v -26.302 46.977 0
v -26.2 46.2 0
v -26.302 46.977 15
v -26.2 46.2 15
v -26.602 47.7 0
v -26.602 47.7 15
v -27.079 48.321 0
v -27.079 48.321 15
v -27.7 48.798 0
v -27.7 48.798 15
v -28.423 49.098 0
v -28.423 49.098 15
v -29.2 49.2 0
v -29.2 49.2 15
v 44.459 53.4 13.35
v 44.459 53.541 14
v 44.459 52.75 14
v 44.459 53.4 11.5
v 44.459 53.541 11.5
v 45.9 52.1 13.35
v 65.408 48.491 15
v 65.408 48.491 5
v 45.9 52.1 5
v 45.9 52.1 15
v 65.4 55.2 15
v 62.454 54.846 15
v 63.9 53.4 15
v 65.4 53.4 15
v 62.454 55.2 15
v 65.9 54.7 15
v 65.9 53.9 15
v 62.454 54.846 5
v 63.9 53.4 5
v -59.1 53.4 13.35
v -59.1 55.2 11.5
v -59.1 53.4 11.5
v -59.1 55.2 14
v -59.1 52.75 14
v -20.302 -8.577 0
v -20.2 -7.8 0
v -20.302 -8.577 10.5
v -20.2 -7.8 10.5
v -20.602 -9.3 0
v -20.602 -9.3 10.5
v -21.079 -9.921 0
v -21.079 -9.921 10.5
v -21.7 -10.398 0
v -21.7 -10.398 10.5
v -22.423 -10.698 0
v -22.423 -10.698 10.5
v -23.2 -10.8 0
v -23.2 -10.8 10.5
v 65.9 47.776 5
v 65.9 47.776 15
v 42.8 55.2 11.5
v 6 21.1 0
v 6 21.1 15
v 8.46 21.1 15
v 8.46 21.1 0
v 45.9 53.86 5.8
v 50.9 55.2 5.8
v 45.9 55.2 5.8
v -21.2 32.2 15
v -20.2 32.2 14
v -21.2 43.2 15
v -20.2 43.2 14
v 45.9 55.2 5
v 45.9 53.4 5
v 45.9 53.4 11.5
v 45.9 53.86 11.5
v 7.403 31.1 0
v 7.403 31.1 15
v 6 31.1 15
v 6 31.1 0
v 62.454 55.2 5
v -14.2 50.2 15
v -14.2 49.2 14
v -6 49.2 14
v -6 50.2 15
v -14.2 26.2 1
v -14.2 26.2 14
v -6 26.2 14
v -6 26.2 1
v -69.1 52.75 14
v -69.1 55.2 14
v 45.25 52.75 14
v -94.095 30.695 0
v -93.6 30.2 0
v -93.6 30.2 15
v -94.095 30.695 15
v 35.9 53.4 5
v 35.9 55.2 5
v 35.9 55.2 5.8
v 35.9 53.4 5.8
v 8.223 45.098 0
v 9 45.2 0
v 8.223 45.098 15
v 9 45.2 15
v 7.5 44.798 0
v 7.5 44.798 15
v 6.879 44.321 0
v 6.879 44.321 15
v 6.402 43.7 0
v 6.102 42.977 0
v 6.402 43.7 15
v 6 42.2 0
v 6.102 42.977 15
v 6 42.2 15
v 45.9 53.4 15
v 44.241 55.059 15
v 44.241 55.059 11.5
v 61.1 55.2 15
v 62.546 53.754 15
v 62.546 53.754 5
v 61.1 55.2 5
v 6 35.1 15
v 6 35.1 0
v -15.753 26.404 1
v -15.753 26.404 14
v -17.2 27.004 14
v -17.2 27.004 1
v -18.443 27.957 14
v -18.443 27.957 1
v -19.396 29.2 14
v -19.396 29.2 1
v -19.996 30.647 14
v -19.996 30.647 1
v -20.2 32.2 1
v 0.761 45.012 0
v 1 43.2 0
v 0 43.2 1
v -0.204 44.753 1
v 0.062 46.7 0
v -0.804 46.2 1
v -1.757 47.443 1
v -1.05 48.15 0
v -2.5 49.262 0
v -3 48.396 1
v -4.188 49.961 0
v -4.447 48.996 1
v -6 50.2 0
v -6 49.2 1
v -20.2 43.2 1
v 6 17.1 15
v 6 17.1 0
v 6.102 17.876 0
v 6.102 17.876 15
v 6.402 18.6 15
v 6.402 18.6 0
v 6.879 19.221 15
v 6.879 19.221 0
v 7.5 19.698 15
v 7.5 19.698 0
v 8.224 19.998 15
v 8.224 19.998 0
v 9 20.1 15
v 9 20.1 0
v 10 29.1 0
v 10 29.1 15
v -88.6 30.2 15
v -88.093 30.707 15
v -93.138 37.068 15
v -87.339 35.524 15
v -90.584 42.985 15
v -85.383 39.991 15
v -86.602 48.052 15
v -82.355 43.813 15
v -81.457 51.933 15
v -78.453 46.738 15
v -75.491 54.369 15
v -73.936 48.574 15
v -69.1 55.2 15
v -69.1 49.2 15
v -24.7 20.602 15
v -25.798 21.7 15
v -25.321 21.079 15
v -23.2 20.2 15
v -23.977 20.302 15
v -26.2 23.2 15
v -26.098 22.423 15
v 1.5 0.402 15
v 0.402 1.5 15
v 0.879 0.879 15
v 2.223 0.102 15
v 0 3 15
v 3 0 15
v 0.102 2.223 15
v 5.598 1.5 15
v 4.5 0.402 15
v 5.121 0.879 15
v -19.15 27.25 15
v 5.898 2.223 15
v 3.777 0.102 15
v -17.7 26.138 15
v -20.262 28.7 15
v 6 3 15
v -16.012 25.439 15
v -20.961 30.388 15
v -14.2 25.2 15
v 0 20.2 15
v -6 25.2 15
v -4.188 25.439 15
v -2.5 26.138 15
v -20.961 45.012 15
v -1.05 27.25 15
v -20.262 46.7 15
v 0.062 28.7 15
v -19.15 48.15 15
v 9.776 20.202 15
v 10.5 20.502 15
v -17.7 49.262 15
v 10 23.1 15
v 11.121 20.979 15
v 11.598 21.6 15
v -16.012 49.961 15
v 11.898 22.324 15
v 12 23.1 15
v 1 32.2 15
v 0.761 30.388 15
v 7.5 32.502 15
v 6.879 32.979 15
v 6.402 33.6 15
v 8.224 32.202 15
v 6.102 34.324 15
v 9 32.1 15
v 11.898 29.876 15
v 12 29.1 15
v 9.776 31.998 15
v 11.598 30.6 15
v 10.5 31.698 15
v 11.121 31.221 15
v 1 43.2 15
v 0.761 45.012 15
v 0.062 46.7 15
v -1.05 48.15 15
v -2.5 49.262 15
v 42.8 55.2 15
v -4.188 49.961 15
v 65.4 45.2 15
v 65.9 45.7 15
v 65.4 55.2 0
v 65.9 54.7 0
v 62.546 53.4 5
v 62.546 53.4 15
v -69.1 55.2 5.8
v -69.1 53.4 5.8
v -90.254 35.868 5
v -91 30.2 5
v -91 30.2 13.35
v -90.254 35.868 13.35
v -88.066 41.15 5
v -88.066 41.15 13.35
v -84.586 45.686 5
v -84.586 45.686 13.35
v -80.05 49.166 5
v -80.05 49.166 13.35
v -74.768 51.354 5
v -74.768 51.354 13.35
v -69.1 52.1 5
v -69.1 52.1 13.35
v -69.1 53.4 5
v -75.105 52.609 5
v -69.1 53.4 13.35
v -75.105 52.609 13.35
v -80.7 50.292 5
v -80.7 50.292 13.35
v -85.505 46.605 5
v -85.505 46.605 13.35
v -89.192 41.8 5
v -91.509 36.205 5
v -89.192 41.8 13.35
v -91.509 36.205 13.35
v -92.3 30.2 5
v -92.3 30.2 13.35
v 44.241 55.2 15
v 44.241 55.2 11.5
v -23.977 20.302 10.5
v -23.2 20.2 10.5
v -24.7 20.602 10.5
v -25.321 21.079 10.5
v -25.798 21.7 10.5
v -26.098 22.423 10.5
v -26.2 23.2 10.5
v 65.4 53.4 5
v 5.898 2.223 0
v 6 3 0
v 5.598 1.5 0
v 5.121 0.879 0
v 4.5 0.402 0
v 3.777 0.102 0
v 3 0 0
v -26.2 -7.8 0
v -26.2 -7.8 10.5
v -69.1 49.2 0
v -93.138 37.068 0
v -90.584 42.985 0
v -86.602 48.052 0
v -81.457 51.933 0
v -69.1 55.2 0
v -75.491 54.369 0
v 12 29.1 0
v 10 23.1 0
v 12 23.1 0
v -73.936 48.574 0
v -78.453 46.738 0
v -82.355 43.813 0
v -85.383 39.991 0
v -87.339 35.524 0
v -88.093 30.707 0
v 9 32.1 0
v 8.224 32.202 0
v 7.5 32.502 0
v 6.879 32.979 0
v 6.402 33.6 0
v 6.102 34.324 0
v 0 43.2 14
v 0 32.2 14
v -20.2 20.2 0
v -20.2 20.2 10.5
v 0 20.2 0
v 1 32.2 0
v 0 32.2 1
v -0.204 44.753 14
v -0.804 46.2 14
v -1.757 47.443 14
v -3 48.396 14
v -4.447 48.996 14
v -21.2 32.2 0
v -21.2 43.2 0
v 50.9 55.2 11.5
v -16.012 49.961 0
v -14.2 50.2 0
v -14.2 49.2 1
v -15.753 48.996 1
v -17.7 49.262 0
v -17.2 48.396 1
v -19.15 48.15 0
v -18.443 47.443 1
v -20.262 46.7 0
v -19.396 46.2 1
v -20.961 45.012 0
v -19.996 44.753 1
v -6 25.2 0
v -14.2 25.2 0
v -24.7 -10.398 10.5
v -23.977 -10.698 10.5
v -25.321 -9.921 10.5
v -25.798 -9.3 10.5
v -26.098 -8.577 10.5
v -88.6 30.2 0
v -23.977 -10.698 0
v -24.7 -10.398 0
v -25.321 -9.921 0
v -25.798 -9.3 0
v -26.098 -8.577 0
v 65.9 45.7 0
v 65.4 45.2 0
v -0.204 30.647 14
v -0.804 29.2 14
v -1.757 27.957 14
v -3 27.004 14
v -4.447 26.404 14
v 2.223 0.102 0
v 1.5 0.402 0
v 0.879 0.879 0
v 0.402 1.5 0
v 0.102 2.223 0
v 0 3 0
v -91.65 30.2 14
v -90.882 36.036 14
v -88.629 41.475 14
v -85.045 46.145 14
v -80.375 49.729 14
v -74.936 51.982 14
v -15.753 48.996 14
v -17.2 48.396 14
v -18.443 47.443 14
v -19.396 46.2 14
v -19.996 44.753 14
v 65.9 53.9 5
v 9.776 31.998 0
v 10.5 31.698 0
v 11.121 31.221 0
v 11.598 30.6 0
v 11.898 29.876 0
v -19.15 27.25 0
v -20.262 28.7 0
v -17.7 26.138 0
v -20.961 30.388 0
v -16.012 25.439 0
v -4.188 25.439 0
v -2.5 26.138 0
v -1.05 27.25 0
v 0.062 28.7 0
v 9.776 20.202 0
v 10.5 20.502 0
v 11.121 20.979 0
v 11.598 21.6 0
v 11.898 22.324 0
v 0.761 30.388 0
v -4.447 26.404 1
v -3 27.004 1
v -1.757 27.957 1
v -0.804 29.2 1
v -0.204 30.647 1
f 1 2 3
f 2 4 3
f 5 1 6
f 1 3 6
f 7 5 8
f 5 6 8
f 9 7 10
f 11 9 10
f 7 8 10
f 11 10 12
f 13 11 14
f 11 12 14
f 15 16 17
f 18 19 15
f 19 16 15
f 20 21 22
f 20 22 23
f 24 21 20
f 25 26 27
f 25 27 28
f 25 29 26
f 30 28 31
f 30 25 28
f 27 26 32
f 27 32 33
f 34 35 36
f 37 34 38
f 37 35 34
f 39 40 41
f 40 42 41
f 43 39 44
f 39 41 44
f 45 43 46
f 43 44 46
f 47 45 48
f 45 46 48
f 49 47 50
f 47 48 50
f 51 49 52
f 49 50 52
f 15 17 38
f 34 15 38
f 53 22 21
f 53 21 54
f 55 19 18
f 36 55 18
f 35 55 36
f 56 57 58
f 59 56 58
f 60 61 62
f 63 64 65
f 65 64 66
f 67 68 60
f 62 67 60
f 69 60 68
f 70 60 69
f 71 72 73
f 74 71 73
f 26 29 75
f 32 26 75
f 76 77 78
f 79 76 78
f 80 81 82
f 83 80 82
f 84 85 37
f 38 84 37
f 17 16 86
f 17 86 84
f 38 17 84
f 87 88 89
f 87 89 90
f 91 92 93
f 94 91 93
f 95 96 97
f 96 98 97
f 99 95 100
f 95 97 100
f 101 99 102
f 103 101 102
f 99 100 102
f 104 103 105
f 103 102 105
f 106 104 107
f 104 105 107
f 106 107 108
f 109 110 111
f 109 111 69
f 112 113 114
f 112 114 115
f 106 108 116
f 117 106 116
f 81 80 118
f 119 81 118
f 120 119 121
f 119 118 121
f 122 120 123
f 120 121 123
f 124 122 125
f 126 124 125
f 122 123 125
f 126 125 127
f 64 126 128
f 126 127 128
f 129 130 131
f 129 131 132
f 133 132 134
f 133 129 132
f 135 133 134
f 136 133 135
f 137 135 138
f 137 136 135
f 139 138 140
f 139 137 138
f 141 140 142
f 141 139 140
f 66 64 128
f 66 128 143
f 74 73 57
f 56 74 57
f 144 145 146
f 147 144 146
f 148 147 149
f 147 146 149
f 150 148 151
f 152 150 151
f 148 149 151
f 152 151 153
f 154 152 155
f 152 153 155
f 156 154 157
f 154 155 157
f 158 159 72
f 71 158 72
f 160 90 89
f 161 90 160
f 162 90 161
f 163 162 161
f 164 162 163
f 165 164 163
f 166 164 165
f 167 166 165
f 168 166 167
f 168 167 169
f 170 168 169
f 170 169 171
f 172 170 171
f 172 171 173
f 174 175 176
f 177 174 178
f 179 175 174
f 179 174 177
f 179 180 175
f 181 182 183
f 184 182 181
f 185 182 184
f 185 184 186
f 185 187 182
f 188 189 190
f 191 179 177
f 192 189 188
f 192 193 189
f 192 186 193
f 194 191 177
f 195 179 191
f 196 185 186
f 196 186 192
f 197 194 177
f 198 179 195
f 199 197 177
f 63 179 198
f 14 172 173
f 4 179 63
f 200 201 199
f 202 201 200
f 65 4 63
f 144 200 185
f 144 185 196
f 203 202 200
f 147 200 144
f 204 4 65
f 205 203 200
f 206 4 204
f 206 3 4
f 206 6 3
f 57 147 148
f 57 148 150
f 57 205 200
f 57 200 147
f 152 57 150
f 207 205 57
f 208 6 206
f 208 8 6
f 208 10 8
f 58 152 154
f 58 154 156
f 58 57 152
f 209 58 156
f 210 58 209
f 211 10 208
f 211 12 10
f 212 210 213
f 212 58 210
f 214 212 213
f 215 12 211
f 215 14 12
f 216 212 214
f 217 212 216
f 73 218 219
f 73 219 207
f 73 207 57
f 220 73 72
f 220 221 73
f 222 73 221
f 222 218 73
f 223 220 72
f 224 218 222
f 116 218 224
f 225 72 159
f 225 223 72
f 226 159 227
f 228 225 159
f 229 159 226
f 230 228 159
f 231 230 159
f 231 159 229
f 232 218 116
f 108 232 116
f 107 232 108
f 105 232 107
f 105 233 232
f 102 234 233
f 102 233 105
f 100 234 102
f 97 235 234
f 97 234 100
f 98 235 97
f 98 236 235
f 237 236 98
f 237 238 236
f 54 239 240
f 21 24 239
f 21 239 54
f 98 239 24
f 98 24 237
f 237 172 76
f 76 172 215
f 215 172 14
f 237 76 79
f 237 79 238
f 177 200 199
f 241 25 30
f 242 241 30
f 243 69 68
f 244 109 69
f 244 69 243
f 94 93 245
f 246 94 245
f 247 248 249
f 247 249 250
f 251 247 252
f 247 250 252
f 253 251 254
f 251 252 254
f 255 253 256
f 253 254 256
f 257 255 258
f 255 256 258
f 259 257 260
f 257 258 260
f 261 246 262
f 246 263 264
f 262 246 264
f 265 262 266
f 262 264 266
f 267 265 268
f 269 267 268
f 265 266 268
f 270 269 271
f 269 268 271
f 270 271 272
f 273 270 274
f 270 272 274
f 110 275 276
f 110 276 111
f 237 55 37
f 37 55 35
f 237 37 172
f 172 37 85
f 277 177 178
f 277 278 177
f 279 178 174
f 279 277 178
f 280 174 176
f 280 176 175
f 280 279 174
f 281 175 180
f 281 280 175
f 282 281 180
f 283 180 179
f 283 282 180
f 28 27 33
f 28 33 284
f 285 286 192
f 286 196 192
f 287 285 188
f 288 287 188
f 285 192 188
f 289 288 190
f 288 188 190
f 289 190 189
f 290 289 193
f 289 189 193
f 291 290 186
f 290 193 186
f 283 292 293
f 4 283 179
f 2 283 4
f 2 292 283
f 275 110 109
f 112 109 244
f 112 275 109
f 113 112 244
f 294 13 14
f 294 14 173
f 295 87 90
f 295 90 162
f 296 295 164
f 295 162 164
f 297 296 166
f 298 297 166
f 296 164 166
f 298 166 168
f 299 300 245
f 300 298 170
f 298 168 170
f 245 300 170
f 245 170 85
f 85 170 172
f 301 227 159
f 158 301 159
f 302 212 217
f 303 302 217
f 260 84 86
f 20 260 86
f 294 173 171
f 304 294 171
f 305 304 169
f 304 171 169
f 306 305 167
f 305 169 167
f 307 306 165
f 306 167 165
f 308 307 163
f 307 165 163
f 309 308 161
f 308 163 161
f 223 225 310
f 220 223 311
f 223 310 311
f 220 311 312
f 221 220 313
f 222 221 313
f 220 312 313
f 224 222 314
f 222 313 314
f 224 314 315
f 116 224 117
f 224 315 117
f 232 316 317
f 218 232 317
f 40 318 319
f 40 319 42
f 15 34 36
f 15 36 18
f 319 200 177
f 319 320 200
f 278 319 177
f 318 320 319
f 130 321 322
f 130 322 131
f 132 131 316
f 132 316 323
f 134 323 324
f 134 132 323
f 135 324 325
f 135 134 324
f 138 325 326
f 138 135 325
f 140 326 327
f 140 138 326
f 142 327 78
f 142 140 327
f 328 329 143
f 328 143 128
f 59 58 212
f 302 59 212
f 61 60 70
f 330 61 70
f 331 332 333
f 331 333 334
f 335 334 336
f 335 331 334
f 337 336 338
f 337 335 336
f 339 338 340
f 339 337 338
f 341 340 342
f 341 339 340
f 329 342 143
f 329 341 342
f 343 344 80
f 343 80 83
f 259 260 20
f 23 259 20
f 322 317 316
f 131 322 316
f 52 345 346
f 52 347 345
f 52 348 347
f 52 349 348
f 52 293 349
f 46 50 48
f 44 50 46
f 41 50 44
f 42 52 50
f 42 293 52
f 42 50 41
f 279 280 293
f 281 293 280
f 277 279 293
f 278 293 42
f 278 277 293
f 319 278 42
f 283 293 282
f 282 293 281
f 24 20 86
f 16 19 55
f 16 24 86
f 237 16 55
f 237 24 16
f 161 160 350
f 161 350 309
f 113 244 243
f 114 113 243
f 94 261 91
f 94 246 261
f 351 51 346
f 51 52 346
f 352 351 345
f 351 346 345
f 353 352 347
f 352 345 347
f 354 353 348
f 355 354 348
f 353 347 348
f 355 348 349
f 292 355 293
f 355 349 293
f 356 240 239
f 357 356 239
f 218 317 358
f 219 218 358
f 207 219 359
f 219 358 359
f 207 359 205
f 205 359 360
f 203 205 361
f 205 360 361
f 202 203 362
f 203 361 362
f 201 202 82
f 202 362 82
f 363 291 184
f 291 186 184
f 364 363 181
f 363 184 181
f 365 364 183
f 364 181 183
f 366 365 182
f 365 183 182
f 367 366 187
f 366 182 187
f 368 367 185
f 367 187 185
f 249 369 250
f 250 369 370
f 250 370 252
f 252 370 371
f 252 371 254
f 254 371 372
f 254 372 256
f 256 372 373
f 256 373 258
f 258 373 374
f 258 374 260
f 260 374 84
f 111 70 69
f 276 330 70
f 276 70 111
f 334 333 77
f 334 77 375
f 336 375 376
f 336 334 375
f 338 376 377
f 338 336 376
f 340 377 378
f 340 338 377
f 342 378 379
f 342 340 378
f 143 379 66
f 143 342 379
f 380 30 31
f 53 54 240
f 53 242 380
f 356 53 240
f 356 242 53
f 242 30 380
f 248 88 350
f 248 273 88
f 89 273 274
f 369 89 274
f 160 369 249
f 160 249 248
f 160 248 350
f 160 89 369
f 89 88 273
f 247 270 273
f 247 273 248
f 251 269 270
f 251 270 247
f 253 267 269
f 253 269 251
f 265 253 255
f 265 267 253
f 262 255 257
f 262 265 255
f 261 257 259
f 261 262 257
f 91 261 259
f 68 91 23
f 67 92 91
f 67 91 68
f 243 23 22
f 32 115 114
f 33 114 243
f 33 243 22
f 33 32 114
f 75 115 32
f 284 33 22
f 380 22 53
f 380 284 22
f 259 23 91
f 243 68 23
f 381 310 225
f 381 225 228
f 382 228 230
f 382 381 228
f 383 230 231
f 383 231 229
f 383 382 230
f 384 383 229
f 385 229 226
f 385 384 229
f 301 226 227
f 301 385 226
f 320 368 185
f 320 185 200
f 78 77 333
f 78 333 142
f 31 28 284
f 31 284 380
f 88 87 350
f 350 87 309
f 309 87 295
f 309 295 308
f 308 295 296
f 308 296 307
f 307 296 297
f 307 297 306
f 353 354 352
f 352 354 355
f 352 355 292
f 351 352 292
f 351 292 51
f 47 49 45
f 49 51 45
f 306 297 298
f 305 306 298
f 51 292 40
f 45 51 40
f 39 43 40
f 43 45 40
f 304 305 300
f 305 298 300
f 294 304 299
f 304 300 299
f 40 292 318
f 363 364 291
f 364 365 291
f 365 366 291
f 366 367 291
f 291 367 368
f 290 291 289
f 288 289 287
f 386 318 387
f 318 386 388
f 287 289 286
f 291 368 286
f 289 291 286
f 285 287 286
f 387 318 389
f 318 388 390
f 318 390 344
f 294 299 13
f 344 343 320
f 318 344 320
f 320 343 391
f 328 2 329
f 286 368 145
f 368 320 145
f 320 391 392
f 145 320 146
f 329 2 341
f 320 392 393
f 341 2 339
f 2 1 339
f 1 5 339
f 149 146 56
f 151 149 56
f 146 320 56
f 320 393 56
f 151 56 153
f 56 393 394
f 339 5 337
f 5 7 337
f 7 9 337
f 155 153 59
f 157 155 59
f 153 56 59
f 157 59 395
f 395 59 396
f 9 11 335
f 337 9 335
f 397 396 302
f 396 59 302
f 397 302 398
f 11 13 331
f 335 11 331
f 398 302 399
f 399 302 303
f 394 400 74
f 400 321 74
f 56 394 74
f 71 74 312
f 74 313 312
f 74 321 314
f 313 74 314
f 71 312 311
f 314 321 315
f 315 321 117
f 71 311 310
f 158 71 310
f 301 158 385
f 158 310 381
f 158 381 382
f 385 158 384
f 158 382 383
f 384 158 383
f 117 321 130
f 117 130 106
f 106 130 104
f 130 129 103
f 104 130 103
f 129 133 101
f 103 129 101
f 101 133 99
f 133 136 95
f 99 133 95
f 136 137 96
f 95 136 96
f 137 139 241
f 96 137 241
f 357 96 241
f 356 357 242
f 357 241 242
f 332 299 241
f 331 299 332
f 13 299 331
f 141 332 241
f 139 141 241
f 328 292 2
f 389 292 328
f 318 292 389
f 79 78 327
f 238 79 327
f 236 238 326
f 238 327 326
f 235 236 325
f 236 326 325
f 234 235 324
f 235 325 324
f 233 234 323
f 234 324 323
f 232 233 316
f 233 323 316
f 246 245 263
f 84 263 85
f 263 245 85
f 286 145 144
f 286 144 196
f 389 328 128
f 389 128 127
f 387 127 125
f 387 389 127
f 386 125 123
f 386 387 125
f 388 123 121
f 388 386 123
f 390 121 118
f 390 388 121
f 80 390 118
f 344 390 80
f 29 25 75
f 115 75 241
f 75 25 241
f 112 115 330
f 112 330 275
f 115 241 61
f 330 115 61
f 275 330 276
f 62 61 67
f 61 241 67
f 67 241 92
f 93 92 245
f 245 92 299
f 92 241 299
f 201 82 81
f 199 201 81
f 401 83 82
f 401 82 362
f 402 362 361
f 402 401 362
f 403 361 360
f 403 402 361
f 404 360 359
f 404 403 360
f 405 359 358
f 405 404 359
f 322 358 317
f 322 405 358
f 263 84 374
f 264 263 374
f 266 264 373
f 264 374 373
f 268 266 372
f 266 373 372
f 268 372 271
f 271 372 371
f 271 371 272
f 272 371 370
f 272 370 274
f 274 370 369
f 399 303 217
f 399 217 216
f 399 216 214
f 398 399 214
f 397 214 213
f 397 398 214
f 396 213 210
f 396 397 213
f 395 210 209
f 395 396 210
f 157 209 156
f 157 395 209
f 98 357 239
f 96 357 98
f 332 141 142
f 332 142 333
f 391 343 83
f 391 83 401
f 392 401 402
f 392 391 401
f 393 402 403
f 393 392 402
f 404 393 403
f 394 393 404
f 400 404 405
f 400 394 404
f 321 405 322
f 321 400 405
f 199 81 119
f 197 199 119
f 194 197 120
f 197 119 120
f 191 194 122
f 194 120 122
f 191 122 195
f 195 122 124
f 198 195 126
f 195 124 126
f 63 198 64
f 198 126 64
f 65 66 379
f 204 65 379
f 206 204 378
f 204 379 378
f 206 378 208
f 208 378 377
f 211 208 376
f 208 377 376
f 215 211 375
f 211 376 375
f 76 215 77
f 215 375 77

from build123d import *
from OCP.BRepFilletAPI import BRepFilletAPI_MakeChamfer

# Parameters (mm, degrees)
BOSS_EXTRUDE1_DEPTH = 15
BOSS_EXTRUDE2_DEPTH = 15
SKETCH6_W           = 115
SKETCH6_H           = 1.3
CUT_EXTRUDE2_DEPTH  = 10
CUT_EXTRUDE3_DEPTH  = 10
CUT_EXTRUDE4_DEPTH  = 10
BOSS_EXTRUDE3_DEPTH = 1
CUT_EXTRUDE5_REACH  = 117.913
SKETCH10_W          = 115
SKETCH10_H          = 5.7
SKETCH13_W          = 20.2
SKETCH13_H          = 23
CUT_EXTRUDE6_DEPTH  = 111.121977825
FILLET1_R           = 6
SKETCH14_W          = 6
SKETCH14_H          = 31
CUT_EXTRUDE7_DEPTH  = 4.5
FILLET2_R           = 3
SKETCH16_W          = 10
SKETCH16_H          = 2.5
CUT_EXTRUDE8_DEPTH  = 1.8
CHAMFER1_SIZE       = 0.5
CHAMFER1_SIZE_2     = 0.623907076
CHAMFER2_SIZE       = 1
CHAMFER3_SIZE       = 5
CHAMFER3_SIZE2      = 1.339745962
CUT_EXTRUDE12_REACH = 112.118
CHAMFER4_SIZE       = 0.2
CHAMFER4_SIZE_2     = 0.141421356
SKETCH25_W          = 6
SKETCH25_H          = 12
BOSS_EXTRUDE6_DEPTH = 15
FILLET4_START       = -1
FILLET4_DEPTH       = 16
FILLET4_2_DEPTH     = 15
CUT_EXTRUDE15_DEPTH = 15
CUT_EXTRUDE16_DEPTH = 10
CHAMFER5_SIZE       = 0.5
CHAMFER5_SIZE2      = 0.353553391
CHAMFER6_SIZE       = 0.65
SKETCH29_W          = 10
SKETCH29_H          = 0.8
CUT_EXTRUDE17_DEPTH = 3.1


with BuildPart() as part:
    # Sketch3 → Boss-Extrude1 (new body)
    with BuildSketch(Plane.XY):
        Polygon((0, 0), (0, 20.2), (-20.2, 20.2), (-20.2, -10.8), (-26.2, -10.8), (-26.2, 49.2), (-69.1, 49.2), (-69.1, 55.2), (5.9, 55.2), (65.9, 55.2), (65.9, 45.2), (6, 45.2), (6, 0), align=None)
    extrude(amount=BOSS_EXTRUDE1_DEPTH)

    # Sketch4 → Boss-Extrude2 (add)
    with BuildSketch(Plane.XY.offset(15)):
        with BuildLine():
            Line((-88.1, 30.2), (-94.1, 30.2))
            ThreePointArc((-94.1, 30.2), (-86.77766953, 47.87766953), (-69.1, 55.2))
            Line((-69.1, 55.2), (-69.1, 49.2))
            ThreePointArc((-69.1, 49.2), (-82.535028843, 43.635028843), (-88.1, 30.2))
        make_face()
    extrude(amount=-BOSS_EXTRUDE2_DEPTH)

    # Sketch6 → Cut-Extrude2 (cut)
    with BuildSketch(Plane.XY.offset(15)):
        with Locations((-11.6, 52.75)):
            Rectangle(SKETCH6_W, SKETCH6_H)
    extrude(amount=-CUT_EXTRUDE2_DEPTH, mode=Mode.SUBTRACT)

    # Sketch7 → Cut-Extrude3 (cut)
    with BuildSketch(Plane.XY.offset(15)):
        with BuildLine():
            Line((-92.3, 30.2), (-91, 30.2))
            ThreePointArc((-91, 30.2), (-84.585638508, 45.685638508), (-69.1, 52.1))
            Line((-69.1, 52.1), (-69.1, 53.4))
            ThreePointArc((-69.1, 53.4), (-85.504877324, 46.604877324), (-92.3, 30.2))
        make_face()
    extrude(amount=-CUT_EXTRUDE3_DEPTH, mode=Mode.SUBTRACT)

    # Sketch8 → Cut-Extrude4 (cut)
    with BuildSketch(Plane.XY.offset(15)):
        Polygon((45.9, 53.4), (65.9, 53.4), (65.9, 48.4), (45.9, 52.1), align=None)
    extrude(amount=-CUT_EXTRUDE4_DEPTH, mode=Mode.SUBTRACT)

    # Sketch9 → Boss-Extrude3 (add)
    with BuildSketch(Plane.XY.offset(15)):
        with BuildLine():
            Line((-69.1, 52.1), (45.9, 52.1))
            Line((45.9, 52.1), (45.9, 53.4))
            Line((45.9, 53.4), (-69.1, 53.4))
            ThreePointArc((-69.1, 53.4), (-85.504877324, 46.604877324), (-92.3, 30.2))
            Line((-92.3, 30.2), (-91, 30.2))
            ThreePointArc((-91, 30.2), (-84.585638508, 45.685638508), (-69.1, 52.1))
        make_face()
    extrude(amount=-BOSS_EXTRUDE3_DEPTH)

    # Cut-Extrude5: up to this face of the body (flat: up to its plane)
    cut_extrude5_end = Plane(part.part.faces().sort_by_distance((-11.6, 52.1, 9.5))[0])
    # Sketch10 → Cut-Extrude5 (cut, up to the picked face)
    with BuildSketch(Plane(origin=(0, 55.2, 0), x_dir=(-1, 0, 0), z_dir=(0, 1, 0)), mode=Mode.PRIVATE) as cut_extrude5_sk1:
        with Locations((11.6, 8.65)):
            Rectangle(SKETCH10_W, SKETCH10_H)
    cut_extrude5_tool1 = split(extrude(cut_extrude5_sk1.sketch, amount=-CUT_EXTRUDE5_REACH, mode=Mode.PRIVATE), bisect_by=cut_extrude5_end, keep=Keep.BOTH, mode=Mode.PRIVATE)
    add(cut_extrude5_tool1.solids().sort_by(Axis((-11.6, 55.2, 8.65), (0, -1, 0)))[0], mode=Mode.SUBTRACT)

    # Sketch13 → Cut-Extrude6 (cut, through all)
    with BuildSketch(Plane.XY.offset(15)):
        with Locations((-10.1, 37.7)):
            Rectangle(SKETCH13_W, SKETCH13_H)
    extrude(amount=-CUT_EXTRUDE6_DEPTH, mode=Mode.SUBTRACT)

    # Fillet1
    fillet1_edges = [part.edges().sort_by_distance(p)[0] for p in [
        (-20.2, 26.2, 7.5),
        (-20.2, 49.2, 7.5),
        (0, 49.2, 7.5),
        (0, 26.2, 7.5),
    ]]
    fillet(fillet1_edges, radius=FILLET1_R)

    # Sketch14 → Cut-Extrude7 (cut)
    with BuildSketch(Plane.XY.offset(15)):
        with Locations((-23.2, 4.7)):
            Rectangle(SKETCH14_W, SKETCH14_H)
    extrude(amount=-CUT_EXTRUDE7_DEPTH, mode=Mode.SUBTRACT)

    # Fillet2
    fillet2_edges = [part.edges().sort_by_distance(p)[0] for p in [
        (-26.2, 49.2, 7.5),
        (6, 45.2, 7.5),
        (-26.2, 20.2, 12.75),
        (6, 0, 7.5),
        (0, 0, 7.5),
        (-20.2, -10.8, 5.25),
        (-26.2, -10.8, 5.25),
    ]]
    fillet(fillet2_edges, radius=FILLET2_R - 0.0001)  # a hair under: the kernel refuses the full size

    # Sketch16 → Cut-Extrude8 (cut)
    with BuildSketch(Plane(origin=(0, 55.2, 0), x_dir=(-1, 0, 0), z_dir=(0, 1, 0))):
        with Locations((64.1, 12.75)):
            Rectangle(SKETCH16_W, SKETCH16_H)
    extrude(amount=-CUT_EXTRUDE8_DEPTH, mode=Mode.SUBTRACT)

    # Chamfer1
    # the kernel refuses this chamfer: 0.623907076, 0.5 mm, written as the material it takes off along each edge
    with BuildSketch(Plane(origin=(65.9, 55.2, -1.285841494), x_dir=(-1, 0, 0), z_dir=(0, 0, 1)), Plane(origin=(65.9, 45.2, -1.285841494), x_dir=(0, 1, 0), z_dir=(0, 0, 1))) as chamfer1_piece_1:
        Polygon((CHAMFER1_SIZE, 0), (0, CHAMFER1_SIZE), (0, 0), align=None)
    extrude(amount=17.571682988, mode=Mode.SUBTRACT)
    with BuildSketch(Plane(origin=(-88.1, 30.2, 16.303301327), x_dir=(-1, 0, 0), z_dir=(0, 0, -1))) as chamfer1_piece_2:
        with BuildLine():
            Line((CHAMFER1_SIZE, 0), (-0.006759226, 0.506759226))
            ThreePointArc((-0.006759226, 0.506759226), (-0.001786833, 0.26056951), (0, 0))
            Line((0, 0), (CHAMFER1_SIZE, 0))
        make_face()
    extrude(amount=17.606602654, mode=Mode.SUBTRACT)
    with BuildSketch(Plane(origin=(-94.1, 30.2, 16.285841494), x_dir=(1, 0, 0), z_dir=(0, 0, -1))) as chamfer1_piece_3:
        with BuildLine():
            Line((CHAMFER1_SIZE, 0), (0.004902903, -0.495097097))
            ThreePointArc((0.004902903, -0.495097097), (0.001296043, -0.254559377), (0, 0))
            Line((0, 0), (CHAMFER1_SIZE, 0))
        make_face()
    extrude(amount=17.571682988, mode=Mode.SUBTRACT)
    with BuildSketch(Plane(origin=(65.9, 53.4, 16.285841494), x_dir=(-1, 0, 0), z_dir=(0, 0, -1))) as chamfer1_piece_4:
        Polygon((CHAMFER1_SIZE, 0), (0, CHAMFER1_SIZE), (0, 0), align=None)
    extrude(amount=11.285841494, mode=Mode.SUBTRACT)
    with BuildSketch(Plane(origin=(65.9, 48.4, 16.611561789), x_dir=(-0.983314592491791, 0.18191319961097666, 0), z_dir=(0, 0, -1))) as chamfer1_piece_5:
        Polygon((CHAMFER1_SIZE, 0), (-CHAMFER1_SIZE_2 * 0.181913199708, -CHAMFER1_SIZE_2 * 0.983314593014), (0, 0), align=None)
    extrude(amount=11.611561789, mode=Mode.SUBTRACT)

    # Chamfer2
    chamfer2_edges = [part.edges().sort_by_distance(p)[0] for p in [
        (-10.1, 49.2, 15),
        (-10.1, 49.2, 0),
        (0, 37.7, 15),
        (0, 37.7, 0),
        (-10.1, 26.2, 15),
        (-10.1, 26.2, 0),
        (-20.2, 37.7, 15),
        (-20.2, 37.7, 0),
        (-1.757359313, 47.442640687, 15),
        (-1.757359313, 47.442640687, 0),
        (-1.757359313, 27.957359313, 15),
        (-1.757359313, 27.957359313, 0),
        (-18.442640687, 27.957359313, 15),
        (-18.442640687, 27.957359313, 0),
        (-18.442640687, 47.442640687, 15),
        (-18.442640687, 47.442640687, 0),
    ]]
    chamfer(chamfer2_edges, length=CHAMFER2_SIZE)

    # Chamfer3
    chamfer3_edges = [part.edges().sort_by_distance(p)[0] for p in [
        (45.9, 55.2, 8.65),
    ]]
    chamfer3_side = [part.faces().sort_by_distance(p)[0] for p in [
        (64.046661535, 55.2, 7.5),
    ]]
    chamfer(chamfer3_edges, length=CHAMFER3_SIZE, length2=CHAMFER3_SIZE2, reference=chamfer3_side[0])

    # Cut-Extrude12: up to this face of the body (flat: up to its plane)
    cut_extrude12_end = Plane(part.part.faces().sort_by_distance((-5.656799941, 54.307895333, 11.5))[0])
    # Sketch20 → Cut-Extrude12 (cut, up to the picked face)
    with BuildSketch(Plane.XY.offset(15), mode=Mode.PRIVATE) as cut_extrude12_sk1:
        Polygon((45.9, 52.1), (42.8, 55.2), (44.1, 55.2), (45.9, 53.4), align=None)
    cut_extrude12_tool1 = split(extrude(cut_extrude12_sk1.sketch, amount=-CUT_EXTRUDE12_REACH, mode=Mode.PRIVATE), bisect_by=cut_extrude12_end, keep=Keep.BOTH, mode=Mode.PRIVATE)
    add(cut_extrude12_tool1.solids().sort_by(Axis((44.646259, 53.946259, 15), (0, 0, -1)))[0], mode=Mode.SUBTRACT)

    # Chamfer4
    # the kernel refuses this chamfer: 0.2, 0.141421356 mm, written as the material it takes off along each edge
    with BuildSketch(Plane(origin=(44.6, 53.4, 10.985663402), x_dir=(-0.7071067811865653, 0.7071067811865298, 0), z_dir=(0, 0, 1))) as chamfer4_piece_1:
        Polygon((CHAMFER4_SIZE, 0), (CHAMFER4_SIZE_2 * 0.707106782373, CHAMFER4_SIZE_2 * 0.707106782373), (0, 0), align=None)
    extrude(amount=3.014336598, mode=Mode.SUBTRACT)
    with BuildSketch(Plane(origin=(44.1, 55.2, 15.514336598), x_dir=(1, 0, 0), z_dir=(0, 0, -1))) as chamfer4_piece_2:
        Polygon((CHAMFER4_SIZE_2 * 1.00000000168, 0), (CHAMFER4_SIZE * 0.707106781187, CHAMFER4_SIZE * 0.707106781186), (0, 0), align=None)
    extrude(amount=4.528673195, mode=Mode.SUBTRACT)

    # Sketch25 → Boss-Extrude6 (add)
    with BuildSketch(Plane.XY.offset(15)):
        with Locations((9, 26.1)):
            Rectangle(SKETCH25_W, SKETCH25_H)
    extrude(amount=-BOSS_EXTRUDE6_DEPTH)

    # Fillet4: read off the stored shape, not the designer's step
    # Fillet4 outline → Fillet4 (cut)
    with BuildSketch(Plane.XY.offset(FILLET4_START)):
        with BuildLine():
            ThreePointArc((9, 32.1), (11.121320344, 31.221320344), (12, 29.1))
            Line((12, 29.1), (12, 32.1))
            Line((12, 32.1), (9, 32.1))
        make_face()
        with BuildLine():
            ThreePointArc((12, 23.1), (11.121320344, 20.978679656), (9, 20.1))
            Line((9, 20.1), (12, 20.1))
            Line((12, 20.1), (12, 23.1))
        make_face()
    extrude(amount=FILLET4_DEPTH, mode=Mode.SUBTRACT)

    # Fillet4 2 outline → Fillet4 2 (add)
    with BuildSketch(Plane.XY):
        with BuildLine():
            Line((6, 32.1), (9, 32.1))
            ThreePointArc((9, 32.1), (6.878679656, 32.978679656), (6, 35.1))
            Line((6, 35.1), (6, 32.1))
        make_face()
        with BuildLine():
            ThreePointArc((6, 17.1), (6.878679656, 19.221320344), (9, 20.1))
            Line((9, 20.1), (6, 20.1))
            Line((6, 20.1), (6, 17.1))
        make_face()
    extrude(amount=FILLET4_2_DEPTH)

    # Sketch26 → Cut-Extrude15 (cut)
    with BuildSketch(Plane.XY.offset(15)):
        Polygon((12, 29.1), (10, 29.1), (7.402667467, 31.1), (6, 31.1), (6, 21.1), (8.459958458, 21.1), (10, 23.1), (12, 23.1), align=None)
    extrude(amount=-CUT_EXTRUDE15_DEPTH, mode=Mode.SUBTRACT)

    # Sketch27 → Cut-Extrude16 (cut)
    with BuildSketch(Plane.XY.offset(15)):
        Polygon((62.9, 53.4), (61.1, 55.2), (62.1, 55.2), (63.9, 53.4), align=None)
    extrude(amount=-CUT_EXTRUDE16_DEPTH, mode=Mode.SUBTRACT)

    # Chamfer5: one chamfer whose edges measure the first distance from different faces: ONE call of the kernel's chamfer builder (chamfer() names one face for all edges)
    chamfer5_edges_1 = [part.edges().sort_by_distance(p)[0] for p in [
        (62.9, 53.4, 10),
    ]]
    chamfer5_side_1 = [part.faces().sort_by_distance(p)[0] for p in [
        (62, 54.3, 10),
    ]]
    chamfer5_edges_2 = [part.edges().sort_by_distance(p)[0] for p in [
        (62.1, 55.2, 10),
    ]]
    chamfer5_side_2 = [part.faces().sort_by_distance(p)[0] for p in [
        (63, 54.3, 10),
    ]]
    chamfer5 = BRepFilletAPI_MakeChamfer(part.part.solid().wrapped)
    for e in chamfer5_edges_1:
        chamfer5.Add(CHAMFER5_SIZE, CHAMFER5_SIZE2, e.wrapped, chamfer5_side_1[0].wrapped)  # the first distance lies on this face
    for e in chamfer5_edges_2:
        chamfer5.Add(CHAMFER5_SIZE, CHAMFER5_SIZE2, e.wrapped, chamfer5_side_2[0].wrapped)  # the first distance lies on this face
    add(Compound.cast(chamfer5.Shape()), mode=Mode.REPLACE)

    # Chamfer6
    chamfer6_edges = [part.edges().sort_by_distance(p)[0] for p in [
        (-7.320710678, 53.4, 14),
        (-11.6, 52.1, 14),
        (-84.585638508, 45.685638508, 14),
        (-85.504877324, 46.604877324, 14),
    ]]
    chamfer(chamfer6_edges, length=CHAMFER6_SIZE - 0.0001)  # a hair under: the kernel refuses the full size

    # Sketch29 → Cut-Extrude17 (cut)
    with BuildSketch(Plane(origin=(0, 55.2, 0), x_dir=(-1, 0, 0), z_dir=(0, 1, 0))):
        with Locations((-40.9, 5.4)):
            Rectangle(SKETCH29_W, SKETCH29_H)
    extrude(amount=-CUT_EXTRUDE17_DEPTH, mode=Mode.SUBTRACT)


solid = part.part
